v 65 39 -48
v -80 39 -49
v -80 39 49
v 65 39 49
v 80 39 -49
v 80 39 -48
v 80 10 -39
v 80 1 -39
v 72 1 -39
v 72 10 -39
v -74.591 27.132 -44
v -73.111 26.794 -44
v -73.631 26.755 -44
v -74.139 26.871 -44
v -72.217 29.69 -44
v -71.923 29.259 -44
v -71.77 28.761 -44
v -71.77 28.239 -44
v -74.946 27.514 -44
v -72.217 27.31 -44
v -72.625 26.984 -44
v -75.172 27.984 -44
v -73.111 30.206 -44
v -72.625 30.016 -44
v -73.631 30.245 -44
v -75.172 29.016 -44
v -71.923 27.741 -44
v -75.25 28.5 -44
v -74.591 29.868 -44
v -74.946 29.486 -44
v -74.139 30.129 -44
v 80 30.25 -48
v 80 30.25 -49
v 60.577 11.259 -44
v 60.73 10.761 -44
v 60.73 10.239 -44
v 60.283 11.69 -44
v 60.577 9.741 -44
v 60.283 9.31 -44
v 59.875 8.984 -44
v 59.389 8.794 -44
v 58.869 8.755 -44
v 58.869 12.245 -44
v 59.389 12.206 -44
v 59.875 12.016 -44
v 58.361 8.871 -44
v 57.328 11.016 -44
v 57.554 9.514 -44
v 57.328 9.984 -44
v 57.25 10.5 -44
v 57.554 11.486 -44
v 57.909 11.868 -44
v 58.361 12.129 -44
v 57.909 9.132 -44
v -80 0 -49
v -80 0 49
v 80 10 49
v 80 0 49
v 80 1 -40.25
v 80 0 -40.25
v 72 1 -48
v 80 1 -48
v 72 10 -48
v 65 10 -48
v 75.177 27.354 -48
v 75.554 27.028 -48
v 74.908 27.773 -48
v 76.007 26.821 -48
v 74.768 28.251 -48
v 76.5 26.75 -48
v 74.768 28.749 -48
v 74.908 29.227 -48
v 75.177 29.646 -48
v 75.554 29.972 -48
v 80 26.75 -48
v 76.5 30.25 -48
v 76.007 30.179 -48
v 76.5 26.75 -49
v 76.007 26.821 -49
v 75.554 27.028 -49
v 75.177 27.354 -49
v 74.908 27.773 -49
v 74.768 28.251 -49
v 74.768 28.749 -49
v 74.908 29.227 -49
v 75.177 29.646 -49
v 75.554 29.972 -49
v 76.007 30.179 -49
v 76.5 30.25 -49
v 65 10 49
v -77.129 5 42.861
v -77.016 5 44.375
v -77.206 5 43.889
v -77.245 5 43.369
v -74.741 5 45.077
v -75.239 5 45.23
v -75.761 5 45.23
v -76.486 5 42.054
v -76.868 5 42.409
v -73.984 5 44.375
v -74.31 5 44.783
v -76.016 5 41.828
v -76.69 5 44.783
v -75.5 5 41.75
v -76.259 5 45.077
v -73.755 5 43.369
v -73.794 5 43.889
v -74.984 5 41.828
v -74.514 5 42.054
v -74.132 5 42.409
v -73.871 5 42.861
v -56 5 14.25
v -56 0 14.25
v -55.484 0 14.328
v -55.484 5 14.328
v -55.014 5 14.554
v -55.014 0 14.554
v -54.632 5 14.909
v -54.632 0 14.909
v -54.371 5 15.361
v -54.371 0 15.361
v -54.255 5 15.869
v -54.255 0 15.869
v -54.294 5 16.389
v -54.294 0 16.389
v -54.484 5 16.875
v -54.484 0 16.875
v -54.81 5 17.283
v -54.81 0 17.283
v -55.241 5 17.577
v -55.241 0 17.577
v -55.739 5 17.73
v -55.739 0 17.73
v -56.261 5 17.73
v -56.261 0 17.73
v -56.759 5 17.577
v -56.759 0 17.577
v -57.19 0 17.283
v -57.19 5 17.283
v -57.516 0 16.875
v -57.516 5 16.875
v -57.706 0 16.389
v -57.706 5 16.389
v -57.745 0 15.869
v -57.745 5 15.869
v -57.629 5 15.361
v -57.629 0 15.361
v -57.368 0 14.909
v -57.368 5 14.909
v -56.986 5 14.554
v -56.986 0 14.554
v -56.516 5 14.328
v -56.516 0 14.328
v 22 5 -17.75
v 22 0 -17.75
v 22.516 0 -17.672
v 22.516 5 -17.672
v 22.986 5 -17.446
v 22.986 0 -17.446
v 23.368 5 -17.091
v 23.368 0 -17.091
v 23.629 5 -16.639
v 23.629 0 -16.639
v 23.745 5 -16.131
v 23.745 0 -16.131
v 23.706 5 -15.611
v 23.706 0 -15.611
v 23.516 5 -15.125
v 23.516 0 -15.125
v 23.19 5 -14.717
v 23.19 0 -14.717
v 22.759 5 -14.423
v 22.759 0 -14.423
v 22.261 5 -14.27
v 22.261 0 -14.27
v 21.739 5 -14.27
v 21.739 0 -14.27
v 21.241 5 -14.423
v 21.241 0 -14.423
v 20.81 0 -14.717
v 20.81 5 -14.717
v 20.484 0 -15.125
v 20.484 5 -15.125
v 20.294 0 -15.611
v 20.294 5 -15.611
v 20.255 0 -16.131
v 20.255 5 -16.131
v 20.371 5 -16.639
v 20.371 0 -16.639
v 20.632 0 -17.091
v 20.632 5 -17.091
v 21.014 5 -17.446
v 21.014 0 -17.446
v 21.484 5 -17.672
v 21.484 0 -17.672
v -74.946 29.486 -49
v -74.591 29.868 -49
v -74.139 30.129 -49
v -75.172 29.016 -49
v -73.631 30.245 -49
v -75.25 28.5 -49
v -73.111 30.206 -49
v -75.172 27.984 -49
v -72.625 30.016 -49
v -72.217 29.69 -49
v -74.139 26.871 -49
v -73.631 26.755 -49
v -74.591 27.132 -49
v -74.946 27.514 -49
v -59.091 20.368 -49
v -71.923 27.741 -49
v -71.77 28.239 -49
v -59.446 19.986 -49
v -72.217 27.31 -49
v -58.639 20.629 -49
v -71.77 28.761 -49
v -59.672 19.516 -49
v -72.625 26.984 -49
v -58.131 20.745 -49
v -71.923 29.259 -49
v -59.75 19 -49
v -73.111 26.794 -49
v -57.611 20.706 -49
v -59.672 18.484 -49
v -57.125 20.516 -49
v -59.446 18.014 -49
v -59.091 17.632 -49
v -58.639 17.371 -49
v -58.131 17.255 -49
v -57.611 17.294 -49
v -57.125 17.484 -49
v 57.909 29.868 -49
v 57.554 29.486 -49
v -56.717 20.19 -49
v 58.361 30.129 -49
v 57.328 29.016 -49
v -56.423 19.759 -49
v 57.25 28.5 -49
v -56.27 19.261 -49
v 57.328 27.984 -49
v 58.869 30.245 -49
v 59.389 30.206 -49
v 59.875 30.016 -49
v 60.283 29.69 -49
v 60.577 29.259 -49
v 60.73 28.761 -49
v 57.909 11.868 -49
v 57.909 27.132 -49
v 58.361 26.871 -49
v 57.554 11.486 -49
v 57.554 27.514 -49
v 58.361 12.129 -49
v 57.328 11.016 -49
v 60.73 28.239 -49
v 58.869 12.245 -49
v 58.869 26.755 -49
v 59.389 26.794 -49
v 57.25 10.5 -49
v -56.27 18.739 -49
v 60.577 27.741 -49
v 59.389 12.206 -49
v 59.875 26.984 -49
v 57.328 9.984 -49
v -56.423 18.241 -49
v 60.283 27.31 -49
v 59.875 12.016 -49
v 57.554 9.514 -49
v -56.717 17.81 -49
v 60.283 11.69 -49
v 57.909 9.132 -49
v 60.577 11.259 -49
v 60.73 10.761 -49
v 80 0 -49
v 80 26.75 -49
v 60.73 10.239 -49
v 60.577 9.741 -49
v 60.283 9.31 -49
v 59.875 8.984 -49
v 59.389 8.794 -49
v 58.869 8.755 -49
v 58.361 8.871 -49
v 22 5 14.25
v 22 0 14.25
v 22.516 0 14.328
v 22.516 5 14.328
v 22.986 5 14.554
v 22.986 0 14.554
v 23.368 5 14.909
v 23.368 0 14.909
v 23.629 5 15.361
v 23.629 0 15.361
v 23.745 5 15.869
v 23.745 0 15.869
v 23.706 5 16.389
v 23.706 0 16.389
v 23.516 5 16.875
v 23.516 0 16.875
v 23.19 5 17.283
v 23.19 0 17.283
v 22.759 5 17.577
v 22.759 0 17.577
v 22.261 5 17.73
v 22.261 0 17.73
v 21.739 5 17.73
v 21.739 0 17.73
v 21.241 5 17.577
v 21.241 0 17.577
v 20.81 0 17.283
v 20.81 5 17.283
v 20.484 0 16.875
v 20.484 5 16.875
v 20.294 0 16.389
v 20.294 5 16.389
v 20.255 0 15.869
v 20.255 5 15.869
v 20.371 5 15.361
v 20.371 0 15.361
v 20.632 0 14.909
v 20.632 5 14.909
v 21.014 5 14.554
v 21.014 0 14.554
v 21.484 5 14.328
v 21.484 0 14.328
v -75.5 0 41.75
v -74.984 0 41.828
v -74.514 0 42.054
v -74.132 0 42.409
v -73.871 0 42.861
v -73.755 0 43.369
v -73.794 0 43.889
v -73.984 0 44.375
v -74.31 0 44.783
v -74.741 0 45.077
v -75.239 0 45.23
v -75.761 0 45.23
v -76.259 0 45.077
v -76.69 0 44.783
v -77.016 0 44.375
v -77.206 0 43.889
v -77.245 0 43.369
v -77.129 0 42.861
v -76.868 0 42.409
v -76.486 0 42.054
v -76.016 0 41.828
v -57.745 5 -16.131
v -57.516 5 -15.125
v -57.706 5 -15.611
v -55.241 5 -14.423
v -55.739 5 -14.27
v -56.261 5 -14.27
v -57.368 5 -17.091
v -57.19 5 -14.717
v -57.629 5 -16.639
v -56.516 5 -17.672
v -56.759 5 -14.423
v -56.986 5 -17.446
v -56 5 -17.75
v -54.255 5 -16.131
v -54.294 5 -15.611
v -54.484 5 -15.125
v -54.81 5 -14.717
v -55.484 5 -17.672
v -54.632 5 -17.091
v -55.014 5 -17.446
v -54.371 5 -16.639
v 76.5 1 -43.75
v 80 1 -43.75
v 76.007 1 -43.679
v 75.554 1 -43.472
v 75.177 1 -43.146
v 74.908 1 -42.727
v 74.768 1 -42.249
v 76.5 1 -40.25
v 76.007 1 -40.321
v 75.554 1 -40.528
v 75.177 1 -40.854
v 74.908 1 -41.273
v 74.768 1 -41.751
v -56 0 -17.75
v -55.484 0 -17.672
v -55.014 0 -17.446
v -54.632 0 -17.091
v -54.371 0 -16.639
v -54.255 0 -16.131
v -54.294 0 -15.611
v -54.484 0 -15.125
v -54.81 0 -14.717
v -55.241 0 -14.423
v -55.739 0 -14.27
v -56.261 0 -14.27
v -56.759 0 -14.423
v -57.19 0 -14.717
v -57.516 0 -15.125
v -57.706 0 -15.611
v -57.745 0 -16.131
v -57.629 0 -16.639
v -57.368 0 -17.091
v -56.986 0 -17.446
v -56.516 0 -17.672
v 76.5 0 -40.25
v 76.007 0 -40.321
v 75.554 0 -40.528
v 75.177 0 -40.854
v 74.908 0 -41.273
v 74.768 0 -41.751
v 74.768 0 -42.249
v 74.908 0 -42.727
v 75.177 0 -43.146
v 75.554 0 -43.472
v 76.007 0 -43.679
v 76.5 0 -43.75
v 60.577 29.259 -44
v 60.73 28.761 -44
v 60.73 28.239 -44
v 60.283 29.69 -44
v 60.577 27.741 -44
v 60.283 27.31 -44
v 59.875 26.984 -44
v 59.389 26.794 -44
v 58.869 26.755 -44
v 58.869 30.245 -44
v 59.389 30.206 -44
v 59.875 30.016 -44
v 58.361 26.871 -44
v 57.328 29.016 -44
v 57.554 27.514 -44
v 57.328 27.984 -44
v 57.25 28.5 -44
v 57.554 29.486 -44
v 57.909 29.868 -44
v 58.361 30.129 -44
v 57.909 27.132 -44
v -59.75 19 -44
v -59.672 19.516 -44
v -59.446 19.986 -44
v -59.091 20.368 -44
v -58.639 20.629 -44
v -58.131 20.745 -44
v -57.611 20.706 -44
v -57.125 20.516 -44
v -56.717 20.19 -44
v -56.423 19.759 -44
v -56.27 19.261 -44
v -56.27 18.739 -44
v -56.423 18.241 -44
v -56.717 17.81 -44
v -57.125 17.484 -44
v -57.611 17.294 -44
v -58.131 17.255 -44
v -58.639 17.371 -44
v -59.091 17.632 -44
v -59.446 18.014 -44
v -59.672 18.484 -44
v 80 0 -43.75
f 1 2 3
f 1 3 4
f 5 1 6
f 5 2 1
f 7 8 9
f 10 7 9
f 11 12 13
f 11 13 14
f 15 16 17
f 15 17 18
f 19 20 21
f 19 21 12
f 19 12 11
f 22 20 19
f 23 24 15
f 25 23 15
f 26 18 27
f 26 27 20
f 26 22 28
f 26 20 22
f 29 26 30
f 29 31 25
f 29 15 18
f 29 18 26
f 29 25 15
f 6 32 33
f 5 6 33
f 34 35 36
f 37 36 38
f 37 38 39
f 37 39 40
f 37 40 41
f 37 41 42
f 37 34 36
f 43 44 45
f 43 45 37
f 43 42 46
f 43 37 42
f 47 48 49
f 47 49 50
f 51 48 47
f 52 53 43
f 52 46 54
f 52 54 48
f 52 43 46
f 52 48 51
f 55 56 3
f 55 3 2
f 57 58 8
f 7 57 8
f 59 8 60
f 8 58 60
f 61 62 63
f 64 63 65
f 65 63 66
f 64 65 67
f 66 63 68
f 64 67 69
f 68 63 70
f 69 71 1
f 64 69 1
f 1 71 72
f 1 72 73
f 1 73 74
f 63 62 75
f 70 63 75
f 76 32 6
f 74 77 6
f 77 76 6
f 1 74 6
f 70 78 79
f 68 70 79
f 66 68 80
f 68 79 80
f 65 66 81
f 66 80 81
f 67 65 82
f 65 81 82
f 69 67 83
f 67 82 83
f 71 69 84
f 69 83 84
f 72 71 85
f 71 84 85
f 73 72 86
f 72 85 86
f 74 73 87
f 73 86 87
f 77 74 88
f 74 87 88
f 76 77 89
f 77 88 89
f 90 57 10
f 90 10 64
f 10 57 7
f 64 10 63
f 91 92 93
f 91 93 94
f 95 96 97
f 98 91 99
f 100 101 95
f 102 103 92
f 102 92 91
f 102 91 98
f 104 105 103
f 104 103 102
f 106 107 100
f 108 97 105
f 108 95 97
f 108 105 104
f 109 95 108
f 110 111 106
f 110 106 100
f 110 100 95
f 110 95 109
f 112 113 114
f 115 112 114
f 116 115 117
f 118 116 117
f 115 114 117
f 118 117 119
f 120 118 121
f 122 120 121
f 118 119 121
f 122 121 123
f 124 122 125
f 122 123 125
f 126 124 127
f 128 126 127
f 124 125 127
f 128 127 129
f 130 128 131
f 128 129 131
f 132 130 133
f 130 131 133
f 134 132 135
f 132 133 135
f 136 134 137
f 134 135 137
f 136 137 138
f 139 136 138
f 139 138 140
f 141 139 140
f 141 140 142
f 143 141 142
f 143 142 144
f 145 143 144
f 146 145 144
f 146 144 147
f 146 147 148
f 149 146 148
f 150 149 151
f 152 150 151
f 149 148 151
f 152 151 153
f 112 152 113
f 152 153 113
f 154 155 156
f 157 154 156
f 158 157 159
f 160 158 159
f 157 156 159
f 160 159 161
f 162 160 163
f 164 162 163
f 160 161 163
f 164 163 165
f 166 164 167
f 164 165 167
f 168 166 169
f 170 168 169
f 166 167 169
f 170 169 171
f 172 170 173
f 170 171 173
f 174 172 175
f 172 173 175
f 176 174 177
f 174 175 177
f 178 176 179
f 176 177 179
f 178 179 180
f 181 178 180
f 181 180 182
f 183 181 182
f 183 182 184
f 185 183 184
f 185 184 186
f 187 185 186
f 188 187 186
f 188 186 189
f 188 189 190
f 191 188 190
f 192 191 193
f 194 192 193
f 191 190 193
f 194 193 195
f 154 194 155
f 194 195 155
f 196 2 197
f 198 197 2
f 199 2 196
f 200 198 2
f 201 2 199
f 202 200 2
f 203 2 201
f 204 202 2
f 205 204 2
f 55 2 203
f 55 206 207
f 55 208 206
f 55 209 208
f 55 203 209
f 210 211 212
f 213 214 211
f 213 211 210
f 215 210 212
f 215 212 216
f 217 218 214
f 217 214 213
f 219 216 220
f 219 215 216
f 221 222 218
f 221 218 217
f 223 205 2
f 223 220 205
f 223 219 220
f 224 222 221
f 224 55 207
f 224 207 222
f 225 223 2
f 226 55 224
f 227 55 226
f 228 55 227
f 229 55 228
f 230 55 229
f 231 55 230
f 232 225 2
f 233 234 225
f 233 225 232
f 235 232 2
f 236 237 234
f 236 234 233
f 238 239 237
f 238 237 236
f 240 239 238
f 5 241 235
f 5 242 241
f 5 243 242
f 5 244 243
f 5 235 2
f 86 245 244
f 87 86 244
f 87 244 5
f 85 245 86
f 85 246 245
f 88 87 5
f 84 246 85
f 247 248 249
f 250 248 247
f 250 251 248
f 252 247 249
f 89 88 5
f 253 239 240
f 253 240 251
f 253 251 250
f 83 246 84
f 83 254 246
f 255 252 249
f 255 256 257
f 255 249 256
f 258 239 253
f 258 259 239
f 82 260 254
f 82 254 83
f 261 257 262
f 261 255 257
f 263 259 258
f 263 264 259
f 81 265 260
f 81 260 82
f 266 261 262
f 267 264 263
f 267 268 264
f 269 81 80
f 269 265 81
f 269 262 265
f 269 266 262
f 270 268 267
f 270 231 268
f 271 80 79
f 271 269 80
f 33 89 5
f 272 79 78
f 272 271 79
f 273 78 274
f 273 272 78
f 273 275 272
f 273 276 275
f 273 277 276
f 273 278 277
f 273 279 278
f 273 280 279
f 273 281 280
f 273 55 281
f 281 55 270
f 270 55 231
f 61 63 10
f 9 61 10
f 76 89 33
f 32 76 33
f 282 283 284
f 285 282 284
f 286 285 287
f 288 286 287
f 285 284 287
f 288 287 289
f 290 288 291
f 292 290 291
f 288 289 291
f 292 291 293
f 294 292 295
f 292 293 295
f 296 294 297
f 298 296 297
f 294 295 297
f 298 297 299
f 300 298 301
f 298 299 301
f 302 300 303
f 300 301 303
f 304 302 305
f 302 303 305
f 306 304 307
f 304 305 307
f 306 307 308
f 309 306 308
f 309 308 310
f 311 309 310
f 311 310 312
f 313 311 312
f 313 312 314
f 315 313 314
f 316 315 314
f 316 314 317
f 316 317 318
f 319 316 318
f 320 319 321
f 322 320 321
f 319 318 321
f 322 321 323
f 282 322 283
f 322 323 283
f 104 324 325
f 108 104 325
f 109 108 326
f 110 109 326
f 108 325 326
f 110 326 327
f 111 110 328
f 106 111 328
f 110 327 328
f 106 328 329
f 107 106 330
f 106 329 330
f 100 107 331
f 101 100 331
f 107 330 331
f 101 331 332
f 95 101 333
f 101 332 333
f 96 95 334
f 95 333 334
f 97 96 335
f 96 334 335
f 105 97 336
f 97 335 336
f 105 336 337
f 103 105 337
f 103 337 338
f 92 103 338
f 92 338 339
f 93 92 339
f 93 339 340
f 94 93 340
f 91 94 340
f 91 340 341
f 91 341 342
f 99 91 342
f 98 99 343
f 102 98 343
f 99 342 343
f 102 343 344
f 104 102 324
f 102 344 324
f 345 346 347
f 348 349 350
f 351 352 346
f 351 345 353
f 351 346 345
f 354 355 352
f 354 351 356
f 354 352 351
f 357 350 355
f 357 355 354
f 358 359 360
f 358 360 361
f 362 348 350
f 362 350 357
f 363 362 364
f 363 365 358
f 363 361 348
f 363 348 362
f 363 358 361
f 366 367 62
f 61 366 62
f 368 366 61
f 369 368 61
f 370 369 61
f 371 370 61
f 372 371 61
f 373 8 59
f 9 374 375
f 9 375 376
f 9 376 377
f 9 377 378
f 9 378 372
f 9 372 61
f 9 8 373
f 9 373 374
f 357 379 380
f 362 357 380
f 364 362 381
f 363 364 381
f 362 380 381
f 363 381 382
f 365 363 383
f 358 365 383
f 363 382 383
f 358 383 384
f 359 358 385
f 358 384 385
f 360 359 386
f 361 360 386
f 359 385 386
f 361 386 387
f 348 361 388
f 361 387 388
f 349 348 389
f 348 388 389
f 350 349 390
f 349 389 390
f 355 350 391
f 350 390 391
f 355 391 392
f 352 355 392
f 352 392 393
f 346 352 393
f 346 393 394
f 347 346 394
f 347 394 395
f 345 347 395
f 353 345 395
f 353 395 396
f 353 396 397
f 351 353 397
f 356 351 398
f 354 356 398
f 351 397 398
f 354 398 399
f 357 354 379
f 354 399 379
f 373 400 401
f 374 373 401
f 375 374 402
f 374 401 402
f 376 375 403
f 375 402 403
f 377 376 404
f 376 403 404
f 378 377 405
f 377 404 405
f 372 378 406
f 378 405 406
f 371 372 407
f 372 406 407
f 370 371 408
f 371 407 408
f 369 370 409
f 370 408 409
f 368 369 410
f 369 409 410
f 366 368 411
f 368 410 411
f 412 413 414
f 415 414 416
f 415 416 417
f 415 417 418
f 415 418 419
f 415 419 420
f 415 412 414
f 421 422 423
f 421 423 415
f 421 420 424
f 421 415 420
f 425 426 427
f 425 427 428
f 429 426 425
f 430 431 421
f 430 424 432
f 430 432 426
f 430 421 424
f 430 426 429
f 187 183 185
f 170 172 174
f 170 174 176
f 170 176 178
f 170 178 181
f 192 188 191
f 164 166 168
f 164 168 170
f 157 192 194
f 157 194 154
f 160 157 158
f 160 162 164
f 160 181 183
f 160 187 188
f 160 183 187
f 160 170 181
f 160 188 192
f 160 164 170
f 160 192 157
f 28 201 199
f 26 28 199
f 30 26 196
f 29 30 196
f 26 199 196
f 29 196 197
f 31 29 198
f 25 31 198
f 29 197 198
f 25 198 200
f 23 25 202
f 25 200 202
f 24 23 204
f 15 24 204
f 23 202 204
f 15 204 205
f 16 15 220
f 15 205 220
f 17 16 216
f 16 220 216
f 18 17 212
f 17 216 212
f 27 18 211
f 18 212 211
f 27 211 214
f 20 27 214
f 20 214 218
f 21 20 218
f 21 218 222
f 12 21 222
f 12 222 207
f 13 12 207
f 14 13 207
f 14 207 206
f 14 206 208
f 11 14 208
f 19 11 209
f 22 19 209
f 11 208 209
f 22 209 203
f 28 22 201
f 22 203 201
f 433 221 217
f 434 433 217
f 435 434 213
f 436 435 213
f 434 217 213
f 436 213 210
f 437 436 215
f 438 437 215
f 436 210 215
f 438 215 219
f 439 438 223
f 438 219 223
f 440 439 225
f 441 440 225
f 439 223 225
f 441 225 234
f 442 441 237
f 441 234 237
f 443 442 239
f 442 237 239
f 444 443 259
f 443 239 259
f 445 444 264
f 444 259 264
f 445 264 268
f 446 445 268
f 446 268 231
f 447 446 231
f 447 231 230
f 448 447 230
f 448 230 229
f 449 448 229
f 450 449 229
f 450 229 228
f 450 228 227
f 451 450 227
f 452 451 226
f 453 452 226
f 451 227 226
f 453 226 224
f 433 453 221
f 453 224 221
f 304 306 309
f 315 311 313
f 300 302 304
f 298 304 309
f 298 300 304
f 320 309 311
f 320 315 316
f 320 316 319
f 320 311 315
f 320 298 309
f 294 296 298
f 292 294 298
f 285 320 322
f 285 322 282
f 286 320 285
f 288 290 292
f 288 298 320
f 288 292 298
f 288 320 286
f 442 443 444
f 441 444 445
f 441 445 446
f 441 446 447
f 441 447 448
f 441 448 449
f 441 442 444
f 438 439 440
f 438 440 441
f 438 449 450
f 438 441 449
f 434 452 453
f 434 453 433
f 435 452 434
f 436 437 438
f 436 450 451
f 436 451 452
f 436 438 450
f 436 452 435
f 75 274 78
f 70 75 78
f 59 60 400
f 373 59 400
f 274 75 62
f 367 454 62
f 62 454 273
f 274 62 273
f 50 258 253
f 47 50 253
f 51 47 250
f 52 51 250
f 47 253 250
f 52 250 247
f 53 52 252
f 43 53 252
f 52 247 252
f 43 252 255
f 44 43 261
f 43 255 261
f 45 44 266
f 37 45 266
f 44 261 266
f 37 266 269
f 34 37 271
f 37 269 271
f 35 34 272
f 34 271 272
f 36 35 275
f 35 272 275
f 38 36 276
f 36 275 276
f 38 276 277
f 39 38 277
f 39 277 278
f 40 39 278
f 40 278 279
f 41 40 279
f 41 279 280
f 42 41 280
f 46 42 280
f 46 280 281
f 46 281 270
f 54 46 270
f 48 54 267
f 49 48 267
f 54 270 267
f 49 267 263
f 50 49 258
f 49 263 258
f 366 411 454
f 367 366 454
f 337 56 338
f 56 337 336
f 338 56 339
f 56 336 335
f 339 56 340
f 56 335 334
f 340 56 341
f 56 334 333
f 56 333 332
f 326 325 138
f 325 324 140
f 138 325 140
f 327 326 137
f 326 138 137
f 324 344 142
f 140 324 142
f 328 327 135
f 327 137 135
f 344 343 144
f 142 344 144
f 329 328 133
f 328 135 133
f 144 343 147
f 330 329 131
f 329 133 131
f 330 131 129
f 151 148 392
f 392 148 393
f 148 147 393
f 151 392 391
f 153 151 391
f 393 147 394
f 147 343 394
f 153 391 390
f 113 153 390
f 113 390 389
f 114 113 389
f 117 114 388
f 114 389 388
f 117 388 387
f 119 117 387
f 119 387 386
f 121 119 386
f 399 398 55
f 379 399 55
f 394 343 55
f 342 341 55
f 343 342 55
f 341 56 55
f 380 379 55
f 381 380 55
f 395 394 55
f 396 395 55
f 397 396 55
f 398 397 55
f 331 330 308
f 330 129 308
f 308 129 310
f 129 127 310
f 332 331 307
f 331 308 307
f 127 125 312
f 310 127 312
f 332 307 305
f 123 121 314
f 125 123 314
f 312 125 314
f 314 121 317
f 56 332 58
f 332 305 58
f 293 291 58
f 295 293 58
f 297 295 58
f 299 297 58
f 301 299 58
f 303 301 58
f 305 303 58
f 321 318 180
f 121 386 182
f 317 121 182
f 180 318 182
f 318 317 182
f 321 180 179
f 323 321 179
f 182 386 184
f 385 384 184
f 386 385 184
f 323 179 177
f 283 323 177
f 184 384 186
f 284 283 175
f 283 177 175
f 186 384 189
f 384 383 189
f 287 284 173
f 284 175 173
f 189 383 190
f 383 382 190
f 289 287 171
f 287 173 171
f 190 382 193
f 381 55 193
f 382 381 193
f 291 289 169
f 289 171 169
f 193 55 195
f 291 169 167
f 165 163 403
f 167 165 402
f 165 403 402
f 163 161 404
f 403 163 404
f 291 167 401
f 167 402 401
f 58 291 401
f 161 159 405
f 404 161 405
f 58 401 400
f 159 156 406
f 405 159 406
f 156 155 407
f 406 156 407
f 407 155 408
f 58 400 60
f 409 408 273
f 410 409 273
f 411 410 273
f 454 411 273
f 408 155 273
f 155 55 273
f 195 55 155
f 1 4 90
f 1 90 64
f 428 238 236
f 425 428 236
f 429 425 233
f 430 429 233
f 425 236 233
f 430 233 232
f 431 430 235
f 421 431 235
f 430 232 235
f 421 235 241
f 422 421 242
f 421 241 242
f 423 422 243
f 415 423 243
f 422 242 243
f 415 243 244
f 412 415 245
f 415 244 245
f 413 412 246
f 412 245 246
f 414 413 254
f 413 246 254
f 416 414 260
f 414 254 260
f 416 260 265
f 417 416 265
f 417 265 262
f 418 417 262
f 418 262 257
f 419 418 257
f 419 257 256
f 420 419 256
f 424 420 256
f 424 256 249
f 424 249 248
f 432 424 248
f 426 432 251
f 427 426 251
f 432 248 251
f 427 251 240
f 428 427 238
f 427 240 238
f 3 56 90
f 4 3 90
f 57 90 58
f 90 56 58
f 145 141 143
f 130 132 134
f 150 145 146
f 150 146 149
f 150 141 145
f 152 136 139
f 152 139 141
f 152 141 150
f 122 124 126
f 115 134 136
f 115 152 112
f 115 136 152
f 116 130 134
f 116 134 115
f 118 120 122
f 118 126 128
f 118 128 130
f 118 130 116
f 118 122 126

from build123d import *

# Parameters (mm, degrees)
SKETCH_1_W          = 160
SKETCH_1_H          = 98
EXTRUDE_1_DEPTH     = 39
SKETCH_2_W          = 97
SKETCH_2_H          = 29
CUT_EXTRUDE_1_DEPTH = 15
SKETCH_3_R          = 1.75
CUT_EXTRUDE_2_DEPTH = 5
SKETCH_4_R          = 1.75
CUT_EXTRUDE_3_DEPTH = 5
SKETCH_5_W          = 8
SKETCH_5_H          = 9
CUT_EXTRUDE_4_DEPTH = 9


with BuildPart() as part:
    # 草图1 → 拉伸1 (new body)
    with BuildSketch(Plane(origin=(0, 0, 0), x_dir=(1, 0, 0), z_dir=(0, 1, 0))):
        Rectangle(SKETCH_1_W, SKETCH_1_H)
    extrude(amount=EXTRUDE_1_DEPTH)

    # 草图2 → 切除-拉伸1 (cut)
    with BuildSketch(Plane(origin=(80, 0, 0), x_dir=(0, 0, -1), z_dir=(1, 0, 0))):
        with Locations((-0.5, 24.5)):
            Rectangle(SKETCH_2_W, SKETCH_2_H)
    extrude(amount=-CUT_EXTRUDE_1_DEPTH, mode=Mode.SUBTRACT)

    # 草图3 → 切除-拉伸2 (cut)
    with BuildSketch(Plane(origin=(0, 0, -49), x_dir=(-1, 0, 0), z_dir=(0, 0, -1))):
        with Locations((-59, 28.5)):
            Circle(SKETCH_3_R)
        with Locations((73.5, 28.5)):
            Circle(SKETCH_3_R)
        with Locations((58, 19)):
            Circle(SKETCH_3_R)
        with Locations((-59, 10.5)):
            Circle(SKETCH_3_R)
        with BuildLine():
            Line((-76.5, 30.25), (-80, 30.25))
            Line((-80, 30.25), (-80, 26.75))
            Line((-80, 26.75), (-76.5, 26.75))
            ThreePointArc((-76.5, 26.75), (-74.75, 28.5), (-76.5, 30.25))
        make_face()
    extrude(amount=-CUT_EXTRUDE_2_DEPTH, mode=Mode.SUBTRACT)

    # 草图4 → 切除-拉伸3 (cut)
    with BuildSketch(Plane.XZ):
        with Locations(Location((22, -16, 0), (0, 0, 270))):
            Circle(SKETCH_4_R)
        with Locations(Location((22, 16, 0), (0, 0, 270))):
            Circle(SKETCH_4_R)
        with Locations(Location((-56, -16, 0), (0, 0, 270))):
            Circle(SKETCH_4_R)
        with Locations(Location((-56, 16, 0), (0, 0, 270))):
            Circle(SKETCH_4_R)
        with Locations(Location((-75.5, 43.5, 0), (0, 0, 270))):
            Circle(SKETCH_4_R)
        with BuildLine():
            Line((76.5, -43.75), (80, -43.75))
            Line((80, -43.75), (80, -40.25))
            Line((80, -40.25), (76.5, -40.25))
            ThreePointArc((76.5, -40.25), (74.75, -42), (76.5, -43.75))
        make_face()
    extrude(amount=-CUT_EXTRUDE_3_DEPTH, mode=Mode.SUBTRACT)

    # 草图5 → 切除-拉伸4 (cut)
    with BuildSketch(Plane(origin=(0, 10, 0), x_dir=(-1, 0, 0), z_dir=(0, 1, 0))):
        with Locations((-76, -43.5)):
            Rectangle(SKETCH_5_W, SKETCH_5_H)
    extrude(amount=-CUT_EXTRUDE_4_DEPTH, mode=Mode.SUBTRACT)


solid = part.part
